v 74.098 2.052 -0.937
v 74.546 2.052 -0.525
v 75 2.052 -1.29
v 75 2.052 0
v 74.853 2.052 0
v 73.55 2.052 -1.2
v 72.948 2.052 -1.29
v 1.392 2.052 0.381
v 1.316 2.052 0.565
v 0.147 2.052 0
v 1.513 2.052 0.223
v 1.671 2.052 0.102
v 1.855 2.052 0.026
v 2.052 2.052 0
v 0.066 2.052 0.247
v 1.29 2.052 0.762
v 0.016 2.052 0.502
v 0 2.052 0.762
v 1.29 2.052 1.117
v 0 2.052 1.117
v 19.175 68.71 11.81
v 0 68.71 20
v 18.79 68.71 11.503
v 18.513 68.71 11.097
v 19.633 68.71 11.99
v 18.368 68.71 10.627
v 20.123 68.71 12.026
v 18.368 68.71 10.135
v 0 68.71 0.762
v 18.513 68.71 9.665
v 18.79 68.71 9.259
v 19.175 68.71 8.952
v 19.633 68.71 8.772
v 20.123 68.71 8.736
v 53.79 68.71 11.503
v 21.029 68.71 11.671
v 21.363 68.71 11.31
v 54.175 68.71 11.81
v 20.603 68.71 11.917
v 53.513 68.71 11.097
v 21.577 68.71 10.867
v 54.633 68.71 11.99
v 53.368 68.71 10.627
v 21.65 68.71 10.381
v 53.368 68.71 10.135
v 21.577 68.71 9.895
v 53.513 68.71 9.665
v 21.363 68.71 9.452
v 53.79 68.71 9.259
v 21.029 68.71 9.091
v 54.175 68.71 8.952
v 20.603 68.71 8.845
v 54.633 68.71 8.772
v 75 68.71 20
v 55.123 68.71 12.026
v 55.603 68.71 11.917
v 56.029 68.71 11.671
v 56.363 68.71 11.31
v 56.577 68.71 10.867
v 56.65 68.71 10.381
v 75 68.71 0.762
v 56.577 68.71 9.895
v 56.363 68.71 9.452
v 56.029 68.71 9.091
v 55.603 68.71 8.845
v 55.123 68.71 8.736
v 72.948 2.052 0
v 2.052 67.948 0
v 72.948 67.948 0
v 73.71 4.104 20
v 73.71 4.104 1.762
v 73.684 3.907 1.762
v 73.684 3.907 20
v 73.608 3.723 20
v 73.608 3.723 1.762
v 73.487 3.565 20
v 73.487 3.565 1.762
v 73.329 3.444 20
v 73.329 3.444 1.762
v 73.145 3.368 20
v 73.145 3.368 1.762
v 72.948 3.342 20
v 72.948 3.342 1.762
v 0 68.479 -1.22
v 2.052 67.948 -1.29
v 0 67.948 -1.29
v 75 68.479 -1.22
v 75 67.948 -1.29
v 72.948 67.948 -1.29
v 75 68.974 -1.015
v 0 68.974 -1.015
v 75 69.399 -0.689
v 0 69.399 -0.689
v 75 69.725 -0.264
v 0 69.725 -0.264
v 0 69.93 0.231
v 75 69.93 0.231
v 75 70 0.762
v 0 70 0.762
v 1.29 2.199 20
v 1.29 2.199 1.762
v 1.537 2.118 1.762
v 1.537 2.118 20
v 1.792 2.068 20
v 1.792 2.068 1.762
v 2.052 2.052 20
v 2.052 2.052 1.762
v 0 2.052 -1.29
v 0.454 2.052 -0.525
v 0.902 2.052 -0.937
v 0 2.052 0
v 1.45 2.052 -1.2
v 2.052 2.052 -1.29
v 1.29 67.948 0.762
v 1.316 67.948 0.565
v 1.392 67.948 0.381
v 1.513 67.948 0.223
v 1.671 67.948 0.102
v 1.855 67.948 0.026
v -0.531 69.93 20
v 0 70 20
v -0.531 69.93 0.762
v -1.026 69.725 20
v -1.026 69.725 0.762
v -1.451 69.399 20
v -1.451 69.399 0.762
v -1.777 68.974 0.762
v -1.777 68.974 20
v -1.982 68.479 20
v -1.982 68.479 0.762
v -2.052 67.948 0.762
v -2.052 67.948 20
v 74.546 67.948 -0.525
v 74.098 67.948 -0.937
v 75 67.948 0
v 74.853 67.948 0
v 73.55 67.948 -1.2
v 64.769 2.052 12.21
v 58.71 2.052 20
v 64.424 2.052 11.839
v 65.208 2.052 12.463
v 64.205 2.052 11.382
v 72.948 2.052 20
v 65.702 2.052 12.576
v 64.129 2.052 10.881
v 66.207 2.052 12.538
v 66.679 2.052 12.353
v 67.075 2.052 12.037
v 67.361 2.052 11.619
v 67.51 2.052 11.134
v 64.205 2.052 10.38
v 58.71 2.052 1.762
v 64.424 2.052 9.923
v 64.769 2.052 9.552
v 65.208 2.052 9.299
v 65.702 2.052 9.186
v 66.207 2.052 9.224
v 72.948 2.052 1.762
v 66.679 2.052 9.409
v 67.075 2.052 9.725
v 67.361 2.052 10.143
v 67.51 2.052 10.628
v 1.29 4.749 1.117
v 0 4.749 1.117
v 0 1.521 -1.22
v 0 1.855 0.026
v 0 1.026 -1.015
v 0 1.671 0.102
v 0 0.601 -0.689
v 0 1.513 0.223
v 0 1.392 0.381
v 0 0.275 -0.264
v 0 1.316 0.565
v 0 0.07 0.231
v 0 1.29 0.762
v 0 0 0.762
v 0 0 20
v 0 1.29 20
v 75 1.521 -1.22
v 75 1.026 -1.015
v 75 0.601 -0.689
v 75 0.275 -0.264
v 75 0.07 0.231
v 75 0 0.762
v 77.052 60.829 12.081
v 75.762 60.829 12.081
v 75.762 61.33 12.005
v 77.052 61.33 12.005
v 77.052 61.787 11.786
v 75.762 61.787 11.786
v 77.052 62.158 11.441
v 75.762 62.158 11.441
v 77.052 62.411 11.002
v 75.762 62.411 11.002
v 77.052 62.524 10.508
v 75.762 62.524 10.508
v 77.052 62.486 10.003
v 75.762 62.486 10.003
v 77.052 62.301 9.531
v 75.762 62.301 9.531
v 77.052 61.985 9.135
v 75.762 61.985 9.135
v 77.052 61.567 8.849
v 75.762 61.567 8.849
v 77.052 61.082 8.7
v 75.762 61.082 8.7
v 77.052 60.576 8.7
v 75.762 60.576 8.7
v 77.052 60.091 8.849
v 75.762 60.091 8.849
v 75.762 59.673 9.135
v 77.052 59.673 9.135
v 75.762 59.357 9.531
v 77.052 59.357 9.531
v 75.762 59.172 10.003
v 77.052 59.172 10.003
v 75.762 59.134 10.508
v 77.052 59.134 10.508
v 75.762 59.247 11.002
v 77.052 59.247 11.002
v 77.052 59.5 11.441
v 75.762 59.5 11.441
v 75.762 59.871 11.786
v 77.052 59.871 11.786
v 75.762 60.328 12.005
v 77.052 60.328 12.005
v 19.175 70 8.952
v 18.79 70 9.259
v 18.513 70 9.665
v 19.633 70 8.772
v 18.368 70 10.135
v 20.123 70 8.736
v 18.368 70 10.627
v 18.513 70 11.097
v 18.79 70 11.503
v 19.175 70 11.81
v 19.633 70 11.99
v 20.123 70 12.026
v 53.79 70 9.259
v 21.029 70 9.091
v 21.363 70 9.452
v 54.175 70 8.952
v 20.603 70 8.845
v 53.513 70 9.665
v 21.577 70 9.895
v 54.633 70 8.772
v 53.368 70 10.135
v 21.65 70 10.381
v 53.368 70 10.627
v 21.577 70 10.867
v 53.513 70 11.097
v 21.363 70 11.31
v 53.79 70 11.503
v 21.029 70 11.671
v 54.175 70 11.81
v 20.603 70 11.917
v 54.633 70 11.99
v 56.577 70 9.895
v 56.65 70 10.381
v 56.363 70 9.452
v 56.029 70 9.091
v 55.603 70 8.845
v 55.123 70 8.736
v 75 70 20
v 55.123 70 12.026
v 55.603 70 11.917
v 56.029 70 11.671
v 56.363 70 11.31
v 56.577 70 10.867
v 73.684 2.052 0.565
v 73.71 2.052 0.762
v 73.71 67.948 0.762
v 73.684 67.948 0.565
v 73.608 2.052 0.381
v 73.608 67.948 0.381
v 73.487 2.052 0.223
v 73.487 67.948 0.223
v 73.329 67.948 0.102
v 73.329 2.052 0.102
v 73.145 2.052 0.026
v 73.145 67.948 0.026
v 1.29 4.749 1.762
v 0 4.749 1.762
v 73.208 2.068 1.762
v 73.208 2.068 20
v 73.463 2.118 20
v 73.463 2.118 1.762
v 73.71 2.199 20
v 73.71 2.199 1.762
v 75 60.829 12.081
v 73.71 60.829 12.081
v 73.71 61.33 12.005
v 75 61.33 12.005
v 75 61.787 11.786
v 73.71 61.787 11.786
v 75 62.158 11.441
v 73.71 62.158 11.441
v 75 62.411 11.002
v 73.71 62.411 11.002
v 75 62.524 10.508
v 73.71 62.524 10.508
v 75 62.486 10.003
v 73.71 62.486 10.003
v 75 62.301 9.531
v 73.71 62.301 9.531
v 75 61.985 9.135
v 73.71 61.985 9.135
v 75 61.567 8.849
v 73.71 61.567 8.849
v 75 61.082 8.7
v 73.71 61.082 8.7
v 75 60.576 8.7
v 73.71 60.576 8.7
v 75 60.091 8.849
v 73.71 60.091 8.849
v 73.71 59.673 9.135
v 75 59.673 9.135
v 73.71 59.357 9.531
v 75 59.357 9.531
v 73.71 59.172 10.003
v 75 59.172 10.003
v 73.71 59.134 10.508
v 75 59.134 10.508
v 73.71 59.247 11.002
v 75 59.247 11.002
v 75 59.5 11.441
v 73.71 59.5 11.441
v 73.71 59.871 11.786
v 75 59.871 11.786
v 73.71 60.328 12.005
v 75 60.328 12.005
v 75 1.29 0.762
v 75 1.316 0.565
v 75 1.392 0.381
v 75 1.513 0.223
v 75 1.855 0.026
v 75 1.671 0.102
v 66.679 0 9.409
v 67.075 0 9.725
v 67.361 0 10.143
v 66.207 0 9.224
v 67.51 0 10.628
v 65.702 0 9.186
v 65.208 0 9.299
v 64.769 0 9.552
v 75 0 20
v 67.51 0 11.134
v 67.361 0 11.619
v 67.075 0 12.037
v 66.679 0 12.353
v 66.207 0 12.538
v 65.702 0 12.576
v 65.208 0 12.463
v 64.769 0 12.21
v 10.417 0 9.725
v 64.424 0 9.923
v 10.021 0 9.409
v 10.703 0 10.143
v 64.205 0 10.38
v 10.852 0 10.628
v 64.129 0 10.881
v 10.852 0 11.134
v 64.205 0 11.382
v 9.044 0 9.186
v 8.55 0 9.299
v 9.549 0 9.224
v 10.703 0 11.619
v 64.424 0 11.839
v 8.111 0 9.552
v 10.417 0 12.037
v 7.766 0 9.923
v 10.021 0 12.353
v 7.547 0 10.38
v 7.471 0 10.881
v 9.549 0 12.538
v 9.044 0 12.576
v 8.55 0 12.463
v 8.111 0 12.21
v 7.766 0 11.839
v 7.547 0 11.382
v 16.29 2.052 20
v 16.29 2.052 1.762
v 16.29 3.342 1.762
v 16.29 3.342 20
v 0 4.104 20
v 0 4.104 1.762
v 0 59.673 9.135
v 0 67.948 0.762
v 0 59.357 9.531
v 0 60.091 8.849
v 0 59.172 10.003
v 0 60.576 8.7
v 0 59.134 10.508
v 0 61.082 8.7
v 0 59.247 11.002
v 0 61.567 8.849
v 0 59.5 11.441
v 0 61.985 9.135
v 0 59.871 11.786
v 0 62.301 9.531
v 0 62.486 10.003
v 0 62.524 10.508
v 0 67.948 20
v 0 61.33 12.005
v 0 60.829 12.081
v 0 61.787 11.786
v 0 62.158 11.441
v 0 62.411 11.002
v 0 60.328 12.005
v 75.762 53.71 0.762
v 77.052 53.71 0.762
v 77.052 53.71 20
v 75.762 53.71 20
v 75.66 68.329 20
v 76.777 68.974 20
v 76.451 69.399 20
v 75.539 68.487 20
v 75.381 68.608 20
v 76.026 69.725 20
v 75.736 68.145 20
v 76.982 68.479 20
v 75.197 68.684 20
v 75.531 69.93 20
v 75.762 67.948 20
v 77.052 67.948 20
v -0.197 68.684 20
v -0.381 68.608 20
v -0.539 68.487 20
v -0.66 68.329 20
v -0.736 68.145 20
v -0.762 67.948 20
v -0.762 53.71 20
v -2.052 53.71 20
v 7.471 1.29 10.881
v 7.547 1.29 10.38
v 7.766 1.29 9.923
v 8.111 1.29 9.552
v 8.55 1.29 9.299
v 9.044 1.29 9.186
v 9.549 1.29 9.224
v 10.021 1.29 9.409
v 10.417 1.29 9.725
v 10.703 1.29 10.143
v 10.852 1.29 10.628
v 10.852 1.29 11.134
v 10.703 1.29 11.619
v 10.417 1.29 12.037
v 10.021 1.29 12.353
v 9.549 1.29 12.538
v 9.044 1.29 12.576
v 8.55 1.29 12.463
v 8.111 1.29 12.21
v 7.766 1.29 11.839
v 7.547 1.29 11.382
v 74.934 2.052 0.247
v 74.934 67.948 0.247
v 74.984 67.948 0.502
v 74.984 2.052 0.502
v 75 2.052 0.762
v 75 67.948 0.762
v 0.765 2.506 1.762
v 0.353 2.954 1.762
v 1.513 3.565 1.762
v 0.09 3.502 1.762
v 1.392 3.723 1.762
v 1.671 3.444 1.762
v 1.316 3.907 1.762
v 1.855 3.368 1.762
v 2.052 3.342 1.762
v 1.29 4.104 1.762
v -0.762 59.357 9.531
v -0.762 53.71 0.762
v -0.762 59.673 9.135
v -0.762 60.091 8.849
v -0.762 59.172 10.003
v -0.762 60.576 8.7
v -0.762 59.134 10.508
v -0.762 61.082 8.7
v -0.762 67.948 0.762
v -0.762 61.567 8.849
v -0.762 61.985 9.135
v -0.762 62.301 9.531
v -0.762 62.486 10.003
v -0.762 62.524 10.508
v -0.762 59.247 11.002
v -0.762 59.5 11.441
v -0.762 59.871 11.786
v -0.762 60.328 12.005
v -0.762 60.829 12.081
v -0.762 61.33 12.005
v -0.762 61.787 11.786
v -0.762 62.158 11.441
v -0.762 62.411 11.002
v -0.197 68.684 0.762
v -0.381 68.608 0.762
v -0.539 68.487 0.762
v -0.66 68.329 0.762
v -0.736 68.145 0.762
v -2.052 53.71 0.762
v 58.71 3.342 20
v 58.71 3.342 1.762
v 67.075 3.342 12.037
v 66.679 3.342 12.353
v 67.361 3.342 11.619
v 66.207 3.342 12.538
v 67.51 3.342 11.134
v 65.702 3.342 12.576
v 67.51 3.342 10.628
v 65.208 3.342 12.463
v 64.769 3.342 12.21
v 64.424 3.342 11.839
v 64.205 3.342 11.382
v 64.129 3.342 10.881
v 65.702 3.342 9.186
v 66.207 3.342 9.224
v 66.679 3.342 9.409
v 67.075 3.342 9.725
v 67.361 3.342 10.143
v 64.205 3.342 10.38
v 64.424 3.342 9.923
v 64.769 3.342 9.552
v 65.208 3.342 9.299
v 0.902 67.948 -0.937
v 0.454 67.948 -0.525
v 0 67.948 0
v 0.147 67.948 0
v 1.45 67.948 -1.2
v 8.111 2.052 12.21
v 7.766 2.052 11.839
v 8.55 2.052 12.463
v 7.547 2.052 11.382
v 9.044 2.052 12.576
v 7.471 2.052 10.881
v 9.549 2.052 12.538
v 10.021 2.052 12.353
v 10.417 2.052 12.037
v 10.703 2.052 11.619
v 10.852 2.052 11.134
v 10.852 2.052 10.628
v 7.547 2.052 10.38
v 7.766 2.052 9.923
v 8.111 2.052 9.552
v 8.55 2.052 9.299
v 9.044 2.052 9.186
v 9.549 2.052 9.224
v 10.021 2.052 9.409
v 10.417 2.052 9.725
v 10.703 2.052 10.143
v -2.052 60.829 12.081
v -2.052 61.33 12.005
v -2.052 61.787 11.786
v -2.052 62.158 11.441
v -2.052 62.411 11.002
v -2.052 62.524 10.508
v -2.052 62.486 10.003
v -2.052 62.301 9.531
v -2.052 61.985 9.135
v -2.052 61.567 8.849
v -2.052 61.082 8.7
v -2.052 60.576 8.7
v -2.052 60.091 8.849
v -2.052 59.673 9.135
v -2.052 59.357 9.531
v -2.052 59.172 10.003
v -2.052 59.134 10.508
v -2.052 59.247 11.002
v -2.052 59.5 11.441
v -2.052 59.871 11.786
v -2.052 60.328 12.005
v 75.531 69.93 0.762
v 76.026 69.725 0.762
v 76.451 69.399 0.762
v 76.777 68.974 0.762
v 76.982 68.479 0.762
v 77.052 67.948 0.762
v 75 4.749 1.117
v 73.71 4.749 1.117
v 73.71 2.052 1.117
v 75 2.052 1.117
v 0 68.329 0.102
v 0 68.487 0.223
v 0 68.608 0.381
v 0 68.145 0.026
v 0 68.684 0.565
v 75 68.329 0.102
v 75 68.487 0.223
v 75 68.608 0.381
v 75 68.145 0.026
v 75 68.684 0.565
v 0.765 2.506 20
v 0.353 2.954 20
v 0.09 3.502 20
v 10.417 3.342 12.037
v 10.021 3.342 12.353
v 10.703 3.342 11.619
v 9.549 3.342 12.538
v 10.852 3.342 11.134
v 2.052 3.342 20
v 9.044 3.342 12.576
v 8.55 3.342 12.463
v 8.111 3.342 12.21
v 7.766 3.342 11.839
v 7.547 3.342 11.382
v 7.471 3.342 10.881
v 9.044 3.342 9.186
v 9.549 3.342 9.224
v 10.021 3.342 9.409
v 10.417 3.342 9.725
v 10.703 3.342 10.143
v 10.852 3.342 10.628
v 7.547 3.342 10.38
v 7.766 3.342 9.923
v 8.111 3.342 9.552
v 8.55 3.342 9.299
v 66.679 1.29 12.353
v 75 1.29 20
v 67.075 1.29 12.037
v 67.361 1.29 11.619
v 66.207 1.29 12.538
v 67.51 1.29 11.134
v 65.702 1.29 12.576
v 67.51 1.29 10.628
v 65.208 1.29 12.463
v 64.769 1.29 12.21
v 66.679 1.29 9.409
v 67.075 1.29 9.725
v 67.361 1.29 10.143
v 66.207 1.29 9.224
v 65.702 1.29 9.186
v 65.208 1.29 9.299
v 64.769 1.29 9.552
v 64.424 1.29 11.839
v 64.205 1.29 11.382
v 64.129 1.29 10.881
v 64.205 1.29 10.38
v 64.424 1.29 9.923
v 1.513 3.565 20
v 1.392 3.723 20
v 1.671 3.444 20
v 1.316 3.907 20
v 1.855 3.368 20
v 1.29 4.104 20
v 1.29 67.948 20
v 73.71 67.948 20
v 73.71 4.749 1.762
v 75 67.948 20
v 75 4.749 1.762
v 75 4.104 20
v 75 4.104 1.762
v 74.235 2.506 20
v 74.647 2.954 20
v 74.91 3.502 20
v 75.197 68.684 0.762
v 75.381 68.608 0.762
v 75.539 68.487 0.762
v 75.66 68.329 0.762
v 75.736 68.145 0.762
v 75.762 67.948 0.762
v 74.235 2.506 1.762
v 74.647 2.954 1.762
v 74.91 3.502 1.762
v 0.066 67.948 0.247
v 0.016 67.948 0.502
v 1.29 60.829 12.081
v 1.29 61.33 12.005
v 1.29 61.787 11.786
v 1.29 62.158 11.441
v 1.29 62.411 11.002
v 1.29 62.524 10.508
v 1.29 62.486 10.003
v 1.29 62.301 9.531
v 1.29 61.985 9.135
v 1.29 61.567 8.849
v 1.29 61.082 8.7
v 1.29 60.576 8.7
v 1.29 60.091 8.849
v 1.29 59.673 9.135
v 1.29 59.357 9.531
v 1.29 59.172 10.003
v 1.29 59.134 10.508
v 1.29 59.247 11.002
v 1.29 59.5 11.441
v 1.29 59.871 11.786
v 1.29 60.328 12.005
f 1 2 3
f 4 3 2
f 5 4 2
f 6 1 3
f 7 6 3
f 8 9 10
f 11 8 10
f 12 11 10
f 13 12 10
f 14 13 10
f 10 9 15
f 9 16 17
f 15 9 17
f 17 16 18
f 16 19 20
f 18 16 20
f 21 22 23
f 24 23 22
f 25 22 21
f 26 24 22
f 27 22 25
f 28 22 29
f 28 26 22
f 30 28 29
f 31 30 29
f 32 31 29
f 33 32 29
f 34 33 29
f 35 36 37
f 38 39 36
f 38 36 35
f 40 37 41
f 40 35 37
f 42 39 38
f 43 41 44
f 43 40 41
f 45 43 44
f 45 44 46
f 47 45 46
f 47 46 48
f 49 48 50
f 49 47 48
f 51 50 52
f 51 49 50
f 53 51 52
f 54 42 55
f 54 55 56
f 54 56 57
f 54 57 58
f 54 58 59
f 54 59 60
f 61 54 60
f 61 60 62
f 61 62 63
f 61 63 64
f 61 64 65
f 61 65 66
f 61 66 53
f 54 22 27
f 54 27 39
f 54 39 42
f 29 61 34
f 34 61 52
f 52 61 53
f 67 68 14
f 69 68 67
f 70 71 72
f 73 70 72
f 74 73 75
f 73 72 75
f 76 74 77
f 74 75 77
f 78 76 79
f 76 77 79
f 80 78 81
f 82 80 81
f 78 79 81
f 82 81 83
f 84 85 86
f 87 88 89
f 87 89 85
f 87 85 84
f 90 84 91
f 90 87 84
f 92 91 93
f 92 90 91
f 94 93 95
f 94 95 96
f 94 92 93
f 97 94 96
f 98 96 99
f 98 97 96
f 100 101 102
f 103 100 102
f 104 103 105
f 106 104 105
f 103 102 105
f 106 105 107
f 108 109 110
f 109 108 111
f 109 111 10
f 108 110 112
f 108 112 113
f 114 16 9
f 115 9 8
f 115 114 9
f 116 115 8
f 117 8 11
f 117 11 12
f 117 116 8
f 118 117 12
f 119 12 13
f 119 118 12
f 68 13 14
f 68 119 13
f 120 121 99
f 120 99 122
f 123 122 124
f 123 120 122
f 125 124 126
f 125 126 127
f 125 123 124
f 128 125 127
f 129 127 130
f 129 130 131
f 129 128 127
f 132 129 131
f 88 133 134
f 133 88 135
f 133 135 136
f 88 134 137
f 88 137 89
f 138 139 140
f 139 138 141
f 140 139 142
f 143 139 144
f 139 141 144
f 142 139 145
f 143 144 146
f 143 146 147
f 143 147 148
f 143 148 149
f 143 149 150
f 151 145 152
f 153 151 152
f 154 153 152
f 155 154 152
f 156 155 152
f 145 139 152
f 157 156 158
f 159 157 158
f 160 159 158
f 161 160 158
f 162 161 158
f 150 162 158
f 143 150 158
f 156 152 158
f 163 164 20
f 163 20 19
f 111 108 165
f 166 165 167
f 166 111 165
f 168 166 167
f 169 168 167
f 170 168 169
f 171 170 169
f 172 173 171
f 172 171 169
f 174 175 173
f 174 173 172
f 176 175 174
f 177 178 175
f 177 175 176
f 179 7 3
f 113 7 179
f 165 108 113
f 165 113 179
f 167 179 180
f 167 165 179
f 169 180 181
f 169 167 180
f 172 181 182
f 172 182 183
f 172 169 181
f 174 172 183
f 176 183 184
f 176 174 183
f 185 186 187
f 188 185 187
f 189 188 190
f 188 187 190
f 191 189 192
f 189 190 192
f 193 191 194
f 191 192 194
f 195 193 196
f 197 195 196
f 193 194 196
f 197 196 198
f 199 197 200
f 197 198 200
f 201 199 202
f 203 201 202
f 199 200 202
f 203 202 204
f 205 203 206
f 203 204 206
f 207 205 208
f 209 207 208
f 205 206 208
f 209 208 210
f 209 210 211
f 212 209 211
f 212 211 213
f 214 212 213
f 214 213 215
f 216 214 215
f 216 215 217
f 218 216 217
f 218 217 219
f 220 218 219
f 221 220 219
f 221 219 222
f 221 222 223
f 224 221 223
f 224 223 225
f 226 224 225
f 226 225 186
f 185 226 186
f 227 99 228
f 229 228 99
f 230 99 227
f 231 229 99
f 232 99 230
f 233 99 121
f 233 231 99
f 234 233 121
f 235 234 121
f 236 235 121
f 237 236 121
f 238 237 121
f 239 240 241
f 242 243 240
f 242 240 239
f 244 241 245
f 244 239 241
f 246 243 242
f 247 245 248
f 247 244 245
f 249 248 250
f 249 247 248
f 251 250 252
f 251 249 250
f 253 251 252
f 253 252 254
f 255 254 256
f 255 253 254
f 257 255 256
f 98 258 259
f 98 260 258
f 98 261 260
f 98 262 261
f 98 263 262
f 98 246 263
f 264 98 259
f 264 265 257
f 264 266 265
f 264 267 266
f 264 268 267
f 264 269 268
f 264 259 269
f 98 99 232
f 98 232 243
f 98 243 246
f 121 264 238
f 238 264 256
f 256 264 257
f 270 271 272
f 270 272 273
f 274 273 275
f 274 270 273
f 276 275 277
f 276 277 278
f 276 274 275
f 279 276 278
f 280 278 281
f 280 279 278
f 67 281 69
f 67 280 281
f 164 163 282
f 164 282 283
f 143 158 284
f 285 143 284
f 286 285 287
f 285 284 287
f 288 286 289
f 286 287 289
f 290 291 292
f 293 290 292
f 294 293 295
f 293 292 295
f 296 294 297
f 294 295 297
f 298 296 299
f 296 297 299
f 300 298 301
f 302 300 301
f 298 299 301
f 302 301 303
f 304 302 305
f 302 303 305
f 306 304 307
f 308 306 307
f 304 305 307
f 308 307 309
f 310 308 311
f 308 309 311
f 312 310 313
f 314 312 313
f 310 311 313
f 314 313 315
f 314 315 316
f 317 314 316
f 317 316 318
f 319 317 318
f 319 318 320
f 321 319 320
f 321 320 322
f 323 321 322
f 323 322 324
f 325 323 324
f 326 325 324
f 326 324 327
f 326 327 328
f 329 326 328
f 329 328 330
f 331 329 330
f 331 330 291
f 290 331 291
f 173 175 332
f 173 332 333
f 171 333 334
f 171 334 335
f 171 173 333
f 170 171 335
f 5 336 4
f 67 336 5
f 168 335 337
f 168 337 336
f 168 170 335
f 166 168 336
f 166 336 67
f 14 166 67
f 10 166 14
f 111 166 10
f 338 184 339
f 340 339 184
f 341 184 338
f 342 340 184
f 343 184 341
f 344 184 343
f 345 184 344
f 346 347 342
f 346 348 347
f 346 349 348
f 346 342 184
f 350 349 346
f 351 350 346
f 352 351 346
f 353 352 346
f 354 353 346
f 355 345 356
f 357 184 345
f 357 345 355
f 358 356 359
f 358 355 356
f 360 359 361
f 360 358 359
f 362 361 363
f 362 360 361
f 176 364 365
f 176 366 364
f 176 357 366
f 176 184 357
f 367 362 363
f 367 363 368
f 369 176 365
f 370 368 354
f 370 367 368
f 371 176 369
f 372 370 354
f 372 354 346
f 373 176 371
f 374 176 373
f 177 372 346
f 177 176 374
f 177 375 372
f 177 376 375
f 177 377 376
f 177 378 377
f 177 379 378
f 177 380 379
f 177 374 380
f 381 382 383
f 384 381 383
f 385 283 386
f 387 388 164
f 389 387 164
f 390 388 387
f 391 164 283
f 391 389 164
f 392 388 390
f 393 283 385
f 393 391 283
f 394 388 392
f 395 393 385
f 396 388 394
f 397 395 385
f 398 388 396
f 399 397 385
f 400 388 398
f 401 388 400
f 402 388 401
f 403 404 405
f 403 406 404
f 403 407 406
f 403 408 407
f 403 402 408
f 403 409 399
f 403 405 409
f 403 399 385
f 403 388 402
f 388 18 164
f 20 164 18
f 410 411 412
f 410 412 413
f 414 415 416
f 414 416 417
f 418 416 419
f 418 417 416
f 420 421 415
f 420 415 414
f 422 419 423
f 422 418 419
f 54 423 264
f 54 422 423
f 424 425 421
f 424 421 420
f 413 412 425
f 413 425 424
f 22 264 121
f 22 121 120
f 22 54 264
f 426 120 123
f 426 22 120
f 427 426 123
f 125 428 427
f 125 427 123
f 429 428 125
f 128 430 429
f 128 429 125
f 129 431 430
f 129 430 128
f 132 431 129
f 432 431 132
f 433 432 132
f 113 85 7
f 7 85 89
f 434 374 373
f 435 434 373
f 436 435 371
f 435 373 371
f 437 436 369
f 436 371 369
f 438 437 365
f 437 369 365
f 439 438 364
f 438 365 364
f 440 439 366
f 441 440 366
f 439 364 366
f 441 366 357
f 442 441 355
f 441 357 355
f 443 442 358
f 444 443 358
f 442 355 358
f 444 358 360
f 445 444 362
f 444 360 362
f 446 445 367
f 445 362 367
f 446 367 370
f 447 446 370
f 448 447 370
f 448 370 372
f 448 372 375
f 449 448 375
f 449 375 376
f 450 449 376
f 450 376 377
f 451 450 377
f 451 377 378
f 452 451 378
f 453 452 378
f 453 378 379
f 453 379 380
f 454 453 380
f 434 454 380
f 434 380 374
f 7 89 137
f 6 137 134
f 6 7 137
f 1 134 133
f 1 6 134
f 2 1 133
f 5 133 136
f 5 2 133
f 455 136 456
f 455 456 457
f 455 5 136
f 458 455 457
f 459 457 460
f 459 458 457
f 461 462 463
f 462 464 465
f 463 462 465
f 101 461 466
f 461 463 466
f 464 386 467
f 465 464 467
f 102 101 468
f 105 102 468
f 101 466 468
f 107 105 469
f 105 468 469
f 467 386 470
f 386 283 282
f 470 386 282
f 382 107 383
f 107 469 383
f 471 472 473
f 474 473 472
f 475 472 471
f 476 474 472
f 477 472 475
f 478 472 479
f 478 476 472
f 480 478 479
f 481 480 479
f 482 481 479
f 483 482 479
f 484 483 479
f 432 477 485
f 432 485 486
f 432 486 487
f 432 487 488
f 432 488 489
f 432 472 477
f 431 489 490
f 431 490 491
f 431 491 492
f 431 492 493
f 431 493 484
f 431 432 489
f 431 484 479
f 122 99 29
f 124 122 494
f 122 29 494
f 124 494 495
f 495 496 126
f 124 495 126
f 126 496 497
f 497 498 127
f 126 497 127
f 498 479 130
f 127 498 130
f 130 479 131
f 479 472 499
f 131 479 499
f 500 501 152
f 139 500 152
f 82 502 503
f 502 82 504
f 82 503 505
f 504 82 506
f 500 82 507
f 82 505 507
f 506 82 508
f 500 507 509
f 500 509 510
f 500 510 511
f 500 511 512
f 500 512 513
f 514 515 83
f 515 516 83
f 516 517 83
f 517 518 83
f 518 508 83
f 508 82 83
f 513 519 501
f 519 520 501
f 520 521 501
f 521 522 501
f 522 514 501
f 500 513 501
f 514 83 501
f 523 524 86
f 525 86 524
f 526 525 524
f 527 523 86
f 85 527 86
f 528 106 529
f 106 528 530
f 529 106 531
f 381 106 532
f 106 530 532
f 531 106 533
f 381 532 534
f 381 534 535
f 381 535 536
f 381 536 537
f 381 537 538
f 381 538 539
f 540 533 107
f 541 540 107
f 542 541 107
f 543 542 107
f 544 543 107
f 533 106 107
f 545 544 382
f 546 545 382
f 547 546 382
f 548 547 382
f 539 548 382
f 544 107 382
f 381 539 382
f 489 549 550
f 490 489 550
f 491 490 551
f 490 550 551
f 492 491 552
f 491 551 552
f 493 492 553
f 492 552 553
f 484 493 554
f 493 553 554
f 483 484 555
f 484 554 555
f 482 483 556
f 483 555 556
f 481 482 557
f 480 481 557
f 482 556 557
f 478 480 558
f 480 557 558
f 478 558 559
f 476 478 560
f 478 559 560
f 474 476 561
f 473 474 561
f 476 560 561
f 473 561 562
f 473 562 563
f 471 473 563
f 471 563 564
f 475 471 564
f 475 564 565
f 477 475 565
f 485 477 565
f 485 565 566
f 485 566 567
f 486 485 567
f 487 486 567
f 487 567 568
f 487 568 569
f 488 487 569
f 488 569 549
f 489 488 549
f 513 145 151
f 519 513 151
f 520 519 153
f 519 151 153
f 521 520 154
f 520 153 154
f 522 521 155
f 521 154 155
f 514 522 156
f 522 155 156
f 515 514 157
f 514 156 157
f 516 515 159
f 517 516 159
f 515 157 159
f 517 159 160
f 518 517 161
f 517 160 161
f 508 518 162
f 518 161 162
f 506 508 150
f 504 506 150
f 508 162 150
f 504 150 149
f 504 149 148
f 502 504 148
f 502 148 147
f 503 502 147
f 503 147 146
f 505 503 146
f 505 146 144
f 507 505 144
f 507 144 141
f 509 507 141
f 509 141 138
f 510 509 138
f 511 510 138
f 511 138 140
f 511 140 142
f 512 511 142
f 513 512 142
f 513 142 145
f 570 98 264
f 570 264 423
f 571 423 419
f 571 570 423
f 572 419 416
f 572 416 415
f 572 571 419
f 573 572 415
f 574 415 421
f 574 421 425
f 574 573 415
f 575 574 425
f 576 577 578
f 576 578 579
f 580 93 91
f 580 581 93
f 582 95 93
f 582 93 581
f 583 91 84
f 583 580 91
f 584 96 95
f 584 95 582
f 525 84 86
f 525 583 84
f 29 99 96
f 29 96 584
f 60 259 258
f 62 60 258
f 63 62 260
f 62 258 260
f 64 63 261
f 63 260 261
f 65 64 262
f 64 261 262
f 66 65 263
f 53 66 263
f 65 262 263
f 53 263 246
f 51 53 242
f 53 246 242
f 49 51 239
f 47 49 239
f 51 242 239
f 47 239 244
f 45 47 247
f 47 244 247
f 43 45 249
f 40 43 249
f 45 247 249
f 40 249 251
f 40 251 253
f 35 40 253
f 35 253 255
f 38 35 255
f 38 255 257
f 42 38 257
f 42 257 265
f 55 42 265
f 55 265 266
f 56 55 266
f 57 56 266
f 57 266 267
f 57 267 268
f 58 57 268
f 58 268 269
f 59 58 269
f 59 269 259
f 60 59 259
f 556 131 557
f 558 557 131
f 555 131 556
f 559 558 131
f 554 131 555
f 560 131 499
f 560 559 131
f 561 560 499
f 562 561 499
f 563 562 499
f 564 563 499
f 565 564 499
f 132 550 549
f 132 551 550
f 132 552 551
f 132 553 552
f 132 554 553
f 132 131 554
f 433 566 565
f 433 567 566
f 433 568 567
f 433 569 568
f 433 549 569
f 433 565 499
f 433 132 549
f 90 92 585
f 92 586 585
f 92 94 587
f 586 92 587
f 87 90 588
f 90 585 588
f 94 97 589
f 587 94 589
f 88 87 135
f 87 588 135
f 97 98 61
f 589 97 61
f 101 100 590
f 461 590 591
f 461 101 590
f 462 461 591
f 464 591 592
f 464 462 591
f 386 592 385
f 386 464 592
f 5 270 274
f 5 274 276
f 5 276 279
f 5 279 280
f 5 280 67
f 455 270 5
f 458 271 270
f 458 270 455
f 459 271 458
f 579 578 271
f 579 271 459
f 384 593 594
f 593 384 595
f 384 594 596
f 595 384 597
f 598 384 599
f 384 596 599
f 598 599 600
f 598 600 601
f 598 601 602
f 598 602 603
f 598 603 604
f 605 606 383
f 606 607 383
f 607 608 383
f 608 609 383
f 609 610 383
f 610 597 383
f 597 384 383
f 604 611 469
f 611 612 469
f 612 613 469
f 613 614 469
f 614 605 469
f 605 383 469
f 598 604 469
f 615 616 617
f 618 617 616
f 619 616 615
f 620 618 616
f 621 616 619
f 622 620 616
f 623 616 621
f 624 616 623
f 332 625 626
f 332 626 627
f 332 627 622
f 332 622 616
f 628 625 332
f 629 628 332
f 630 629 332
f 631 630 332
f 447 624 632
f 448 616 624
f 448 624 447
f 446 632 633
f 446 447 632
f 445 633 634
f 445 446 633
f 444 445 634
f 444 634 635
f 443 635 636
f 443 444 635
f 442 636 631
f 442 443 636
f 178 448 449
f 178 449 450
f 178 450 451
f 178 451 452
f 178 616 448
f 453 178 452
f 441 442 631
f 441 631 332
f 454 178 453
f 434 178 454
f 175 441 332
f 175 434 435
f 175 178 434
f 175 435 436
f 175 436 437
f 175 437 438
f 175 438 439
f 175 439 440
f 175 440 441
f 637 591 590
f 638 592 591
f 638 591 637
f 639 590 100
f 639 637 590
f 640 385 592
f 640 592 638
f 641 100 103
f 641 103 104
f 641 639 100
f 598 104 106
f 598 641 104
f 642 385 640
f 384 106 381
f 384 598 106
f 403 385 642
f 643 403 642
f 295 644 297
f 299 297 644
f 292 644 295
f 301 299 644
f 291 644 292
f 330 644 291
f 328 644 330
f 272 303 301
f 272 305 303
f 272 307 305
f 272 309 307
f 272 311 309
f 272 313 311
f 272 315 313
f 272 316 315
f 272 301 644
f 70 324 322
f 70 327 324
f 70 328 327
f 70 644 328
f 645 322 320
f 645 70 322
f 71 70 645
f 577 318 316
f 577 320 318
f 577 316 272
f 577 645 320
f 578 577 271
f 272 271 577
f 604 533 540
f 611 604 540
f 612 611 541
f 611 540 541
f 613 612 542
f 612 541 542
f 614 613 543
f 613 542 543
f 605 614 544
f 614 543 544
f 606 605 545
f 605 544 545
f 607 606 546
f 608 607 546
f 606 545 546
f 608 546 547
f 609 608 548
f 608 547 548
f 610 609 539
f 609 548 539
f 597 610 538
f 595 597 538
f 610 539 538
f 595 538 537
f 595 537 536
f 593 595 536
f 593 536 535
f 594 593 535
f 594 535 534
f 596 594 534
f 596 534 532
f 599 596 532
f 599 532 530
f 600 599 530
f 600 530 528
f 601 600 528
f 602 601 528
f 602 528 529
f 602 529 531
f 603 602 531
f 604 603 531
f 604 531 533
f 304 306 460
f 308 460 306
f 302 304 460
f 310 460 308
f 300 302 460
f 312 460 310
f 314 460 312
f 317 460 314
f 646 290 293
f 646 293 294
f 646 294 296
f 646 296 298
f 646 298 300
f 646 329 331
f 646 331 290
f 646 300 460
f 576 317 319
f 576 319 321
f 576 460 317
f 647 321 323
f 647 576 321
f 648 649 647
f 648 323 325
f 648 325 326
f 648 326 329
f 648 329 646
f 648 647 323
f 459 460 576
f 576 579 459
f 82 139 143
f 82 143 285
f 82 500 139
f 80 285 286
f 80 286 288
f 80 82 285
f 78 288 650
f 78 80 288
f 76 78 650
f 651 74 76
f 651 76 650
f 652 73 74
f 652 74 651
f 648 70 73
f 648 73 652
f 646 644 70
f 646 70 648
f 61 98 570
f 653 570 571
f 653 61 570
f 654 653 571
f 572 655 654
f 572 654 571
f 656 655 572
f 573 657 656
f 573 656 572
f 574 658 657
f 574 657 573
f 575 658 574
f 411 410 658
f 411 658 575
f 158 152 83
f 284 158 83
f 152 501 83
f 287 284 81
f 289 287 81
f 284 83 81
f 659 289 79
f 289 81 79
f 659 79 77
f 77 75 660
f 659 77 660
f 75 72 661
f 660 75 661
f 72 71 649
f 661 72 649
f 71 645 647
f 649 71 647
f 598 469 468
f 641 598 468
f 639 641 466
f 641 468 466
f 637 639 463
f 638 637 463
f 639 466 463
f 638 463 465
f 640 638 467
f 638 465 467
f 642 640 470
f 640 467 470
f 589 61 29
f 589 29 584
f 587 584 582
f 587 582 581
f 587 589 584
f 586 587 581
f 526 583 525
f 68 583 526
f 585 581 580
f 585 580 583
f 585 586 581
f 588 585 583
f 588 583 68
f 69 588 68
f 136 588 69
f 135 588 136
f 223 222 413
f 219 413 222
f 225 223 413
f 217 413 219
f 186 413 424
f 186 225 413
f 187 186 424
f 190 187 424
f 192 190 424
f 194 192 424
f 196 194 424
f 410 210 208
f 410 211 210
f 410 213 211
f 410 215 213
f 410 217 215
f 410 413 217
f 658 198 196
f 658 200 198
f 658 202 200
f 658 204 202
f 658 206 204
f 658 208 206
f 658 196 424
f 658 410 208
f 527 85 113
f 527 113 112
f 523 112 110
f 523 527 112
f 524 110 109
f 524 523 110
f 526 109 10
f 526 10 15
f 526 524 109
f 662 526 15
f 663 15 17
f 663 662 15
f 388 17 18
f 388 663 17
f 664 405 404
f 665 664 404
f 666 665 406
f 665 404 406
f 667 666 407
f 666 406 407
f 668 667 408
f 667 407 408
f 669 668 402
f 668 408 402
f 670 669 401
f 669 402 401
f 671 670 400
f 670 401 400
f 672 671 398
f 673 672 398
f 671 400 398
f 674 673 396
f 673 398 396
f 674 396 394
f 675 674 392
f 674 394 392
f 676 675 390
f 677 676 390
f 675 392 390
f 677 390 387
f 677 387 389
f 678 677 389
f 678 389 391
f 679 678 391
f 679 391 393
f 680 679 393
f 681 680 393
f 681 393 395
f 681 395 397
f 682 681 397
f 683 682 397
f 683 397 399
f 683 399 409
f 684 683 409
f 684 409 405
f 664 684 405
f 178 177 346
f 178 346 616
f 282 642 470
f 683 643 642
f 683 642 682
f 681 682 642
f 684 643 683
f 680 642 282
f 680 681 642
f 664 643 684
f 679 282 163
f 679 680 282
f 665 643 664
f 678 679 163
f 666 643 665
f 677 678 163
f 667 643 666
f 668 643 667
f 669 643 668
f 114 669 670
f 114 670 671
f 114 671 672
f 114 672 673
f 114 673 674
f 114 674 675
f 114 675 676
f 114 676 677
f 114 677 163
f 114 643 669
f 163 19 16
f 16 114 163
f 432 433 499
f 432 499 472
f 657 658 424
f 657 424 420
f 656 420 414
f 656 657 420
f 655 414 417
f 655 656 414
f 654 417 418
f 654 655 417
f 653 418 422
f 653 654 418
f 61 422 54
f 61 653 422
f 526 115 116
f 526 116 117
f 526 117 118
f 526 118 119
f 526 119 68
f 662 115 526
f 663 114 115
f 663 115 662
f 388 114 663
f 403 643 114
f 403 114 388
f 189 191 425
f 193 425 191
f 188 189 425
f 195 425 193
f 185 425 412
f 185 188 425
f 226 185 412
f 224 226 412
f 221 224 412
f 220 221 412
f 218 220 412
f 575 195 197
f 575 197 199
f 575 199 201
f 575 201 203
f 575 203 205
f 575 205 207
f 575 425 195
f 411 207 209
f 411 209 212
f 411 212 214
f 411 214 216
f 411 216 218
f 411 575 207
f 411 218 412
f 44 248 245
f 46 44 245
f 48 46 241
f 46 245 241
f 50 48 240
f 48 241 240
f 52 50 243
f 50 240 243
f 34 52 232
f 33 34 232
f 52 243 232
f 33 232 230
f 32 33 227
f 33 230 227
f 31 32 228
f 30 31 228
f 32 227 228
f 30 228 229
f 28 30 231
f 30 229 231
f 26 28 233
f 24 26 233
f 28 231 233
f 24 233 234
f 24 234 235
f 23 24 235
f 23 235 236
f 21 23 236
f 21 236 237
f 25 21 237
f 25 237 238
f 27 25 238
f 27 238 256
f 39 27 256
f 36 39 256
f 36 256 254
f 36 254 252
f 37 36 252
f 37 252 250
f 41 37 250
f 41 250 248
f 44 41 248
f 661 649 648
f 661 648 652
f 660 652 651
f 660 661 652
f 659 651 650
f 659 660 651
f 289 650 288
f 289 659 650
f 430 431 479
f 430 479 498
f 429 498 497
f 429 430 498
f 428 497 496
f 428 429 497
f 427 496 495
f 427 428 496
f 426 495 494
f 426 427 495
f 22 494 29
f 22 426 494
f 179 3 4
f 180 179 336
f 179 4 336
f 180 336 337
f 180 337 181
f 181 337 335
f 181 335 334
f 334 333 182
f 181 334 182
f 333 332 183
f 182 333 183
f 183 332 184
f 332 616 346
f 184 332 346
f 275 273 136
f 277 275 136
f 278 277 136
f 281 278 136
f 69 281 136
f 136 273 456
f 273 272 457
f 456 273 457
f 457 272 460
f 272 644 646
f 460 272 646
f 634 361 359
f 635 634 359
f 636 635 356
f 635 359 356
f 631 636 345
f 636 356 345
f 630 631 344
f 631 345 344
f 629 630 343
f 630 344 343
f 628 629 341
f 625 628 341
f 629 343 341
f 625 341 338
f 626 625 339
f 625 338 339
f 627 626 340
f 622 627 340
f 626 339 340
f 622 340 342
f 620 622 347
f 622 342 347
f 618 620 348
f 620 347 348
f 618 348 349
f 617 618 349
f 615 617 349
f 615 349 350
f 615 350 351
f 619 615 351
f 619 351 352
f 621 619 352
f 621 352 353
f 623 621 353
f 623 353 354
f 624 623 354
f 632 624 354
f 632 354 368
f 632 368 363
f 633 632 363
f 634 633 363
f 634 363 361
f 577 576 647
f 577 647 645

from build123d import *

# Parameters (mm, degrees)
SKETCH1_W                        = 75
SKETCH1_H                        = 70
BASE_FLANGE1_DEPTH               = 1.29
EDGE_FLANGE1_STRIP_W             = 6.684
EDGE_FLANGE1_STRIP_H             = 1.29
EDGE_FLANGE1_STRIP_CUT_DEPTH     = 75
EDGE_FLANGE1_DEPTH               = 75
EDGE_FLANGE2_STRIP_W             = 6.684
EDGE_FLANGE2_STRIP_H             = 1.29
EDGE_FLANGE2_STRIP_CUT_DEPTH     = 75
EDGE_FLANGE2_DEPTH               = 75
EDGE_FLANGE3_STRIP_W             = 6.684
EDGE_FLANGE3_STRIP_H             = 1.29
EDGE_FLANGE3_STRIP_CUT_DEPTH     = 65.896
EDGE_FLANGE3_DEPTH               = 65.896
EDGE_FLANGE4_STRIP_W             = 6.684
EDGE_FLANGE4_STRIP_H             = 1.29
EDGE_FLANGE4_STRIP_CUT_DEPTH     = 65.896
EDGE_FLANGE4_DEPTH               = 65.896
EDGE_FLANGE6_START               = 1.117
EDGE_FLANGE6_DEPTH               = 18.883
EDGE_FLANGE6_2_DEPTH             = 0.645
EDGE_FLANGE6_START_2             = 1.762
EDGE_FLANGE6_3_DEPTH             = 18.238
EDGE_FLANGE8_START               = 1.117
EDGE_FLANGE8_DEPTH               = 18.883
EDGE_FLANGE8_2_DEPTH             = 0.645
EDGE_FLANGE8_START_2             = 1.762
EDGE_FLANGE8_3_DEPTH             = 18.238
EDGE_FLANGE9_DEPTH               = 19.238
EDGE_FLANGE10_DEPTH              = 19.238
TAP_DRILL_FOR_M4X0_7_TAP1_REACH  = 108.005
TAP_DRILL_FOR_M4X0_7_TAP1_BORE_R = 1.65
M3_CLEARANCE_HOLE1_D             = 3.4
M3_CLEARANCE_HOLE1_DEPTH         = 3.342
M3_CLEARANCE_HOLE2_D             = 3.4


# Read off the part's stored shape, not the designer's step: Edge-Flange6, Edge-Flange8
# Sheet-metal steps are written as plain solids
with BuildPart() as part:
    # Sketch1 → Base-Flange1 (new body)
    with BuildSketch(Plane.XY):
        with Locations((37.5, 35)):
            Rectangle(SKETCH1_W, SKETCH1_H)
    extrude(amount=-BASE_FLANGE1_DEPTH)

    # Edge-Flange1 strip (across the edge) → Edge-Flange1 strip cut (cut)
    with BuildSketch(Plane(origin=(75, 70, 0), x_dir=(0, -1, 0), z_dir=(-1, 0, 0))):
        with Locations((-1.29, -0.645)):
            Rectangle(EDGE_FLANGE1_STRIP_W, EDGE_FLANGE1_STRIP_H)
    extrude(amount=EDGE_FLANGE1_STRIP_CUT_DEPTH, mode=Mode.SUBTRACT)

    # Edge-Flange1 section (across the edge) → Edge-Flange1 (add)
    with BuildSketch(Plane(origin=(75, 70, 0), x_dir=(0, -1, 0), z_dir=(-1, 0, 0))):
        with BuildLine():
            Line((0, 0.762), (0, 20))
            Line((0, 20), (1.29, 20))
            Line((1.29, 20), (1.29, 0.762))
            ThreePointArc((1.29, 0.762), (1.513184633, 0.223184633), (2.052, 0))
            Line((2.052, 0), (2.052, -1.29))
            ThreePointArc((2.052, -1.29), (0.601016885, -0.688983115), (0, 0.762))
        make_face()
    extrude(amount=EDGE_FLANGE1_DEPTH)

    # Edge-Flange2 strip (across the edge) → Edge-Flange2 strip cut (cut)
    with BuildSketch(Plane.YZ):
        with Locations((-1.29, -0.645)):
            Rectangle(EDGE_FLANGE2_STRIP_W, EDGE_FLANGE2_STRIP_H)
    extrude(amount=EDGE_FLANGE2_STRIP_CUT_DEPTH, mode=Mode.SUBTRACT)

    # Edge-Flange2 section (across the edge) → Edge-Flange2 (add)
    with BuildSketch(Plane.YZ):
        with BuildLine():
            Line((0, 0.762), (0, 20))
            Line((0, 20), (1.29, 20))
            Line((1.29, 20), (1.29, 0.762))
            ThreePointArc((1.29, 0.762), (1.513184633, 0.223184633), (2.052, 0))
            Line((2.052, 0), (2.052, -1.29))
            ThreePointArc((2.052, -1.29), (0.601016885, -0.688983115), (0, 0.762))
        make_face()
    extrude(amount=EDGE_FLANGE2_DEPTH)

    # Edge-Flange3 strip (across the edge) → Edge-Flange3 strip cut (cut)
    with BuildSketch(Plane.XZ.offset(-67.948)):
        with Locations((-1.29, -0.645)):
            Rectangle(EDGE_FLANGE3_STRIP_W, EDGE_FLANGE3_STRIP_H)
    extrude(amount=EDGE_FLANGE3_STRIP_CUT_DEPTH, mode=Mode.SUBTRACT)

    # Edge-Flange3 section (across the edge) → Edge-Flange3 (add)
    with BuildSketch(Plane.XZ.offset(-67.948)):
        with BuildLine():
            Line((0, 0.762), (0, 20))
            Line((0, 20), (1.29, 20))
            Line((1.29, 20), (1.29, 0.762))
            ThreePointArc((1.29, 0.762), (1.513184633, 0.223184633), (2.052, 0))
            Line((2.052, 0), (2.052, -1.29))
            ThreePointArc((2.052, -1.29), (0.601016885, -0.688983115), (0, 0.762))
        make_face()
    extrude(amount=EDGE_FLANGE3_DEPTH)

    # Edge-Flange4 strip (across the edge) → Edge-Flange4 strip cut (cut)
    with BuildSketch(Plane(origin=(75, 2.052, 0), x_dir=(-1, 0, 0), z_dir=(0, 1, 0))):
        with Locations((-1.29, -0.645)):
            Rectangle(EDGE_FLANGE4_STRIP_W, EDGE_FLANGE4_STRIP_H)
    extrude(amount=EDGE_FLANGE4_STRIP_CUT_DEPTH, mode=Mode.SUBTRACT)

    # Edge-Flange4 section (across the edge) → Edge-Flange4 (add)
    with BuildSketch(Plane(origin=(75, 2.052, 0), x_dir=(-1, 0, 0), z_dir=(0, 1, 0))):
        with BuildLine():
            Line((0, 0.762), (0, 20))
            Line((0, 20), (1.29, 20))
            Line((1.29, 20), (1.29, 0.762))
            ThreePointArc((1.29, 0.762), (1.513184633, 0.223184633), (2.052, 0))
            Line((2.052, 0), (2.052, -1.29))
            ThreePointArc((2.052, -1.29), (0.601016885, -0.688983115), (0, 0.762))
        make_face()
    extrude(amount=EDGE_FLANGE4_DEPTH)

    # Edge-Flange6 outline → Edge-Flange6 (cut)
    with BuildSketch(Plane.XY.offset(EDGE_FLANGE6_START)):
        with BuildLine():
            Line((1.29, 2.052), (1.29, 2.198728366))
            ThreePointArc((1.29, 2.198728366), (0.352834322, 2.953547915), (0, 4.104))
            Line((0, 4.104), (0, 2.052))
            Line((0, 2.052), (1.29, 2.052))
        make_face()
    extrude(amount=EDGE_FLANGE6_DEPTH, mode=Mode.SUBTRACT)

    # Edge-Flange6 2 outline → Edge-Flange6 2 (cut)
    with BuildSketch(Plane.XY.offset(EDGE_FLANGE6_START)):
        with BuildLine():
            ThreePointArc((0, 4.104), (0.352834322, 2.953547915), (1.29, 2.198728366))
            Line((1.29, 2.198728366), (1.29, 4.749))
            Line((1.29, 4.749), (0, 4.749))
            Line((0, 4.749), (0, 4.104))
        make_face()
    extrude(amount=EDGE_FLANGE6_2_DEPTH, mode=Mode.SUBTRACT)

    # Edge-Flange6 3 outline → Edge-Flange6 3 (add)
    with BuildSketch(Plane.XY.offset(EDGE_FLANGE6_START_2)):
        with BuildLine():
            Line((2.052, 2.052), (16.29, 2.052))
            Line((16.29, 2.052), (16.29, 3.342))
            Line((16.29, 3.342), (2.052, 3.342))
            ThreePointArc((2.052, 3.342), (1.513184633, 3.565184633), (1.29, 4.104))
            Line((1.29, 4.104), (1.29, 2.198728366))
            ThreePointArc((1.29, 2.198728366), (1.664000898, 2.089015956), (2.052, 2.052))
        make_face()
    extrude(amount=EDGE_FLANGE6_3_DEPTH)

    # Edge-Flange8 outline → Edge-Flange8 (cut)
    with BuildSketch(Plane.XY.offset(EDGE_FLANGE8_START)):
        with BuildLine():
            ThreePointArc((75, 4.104), (74.647165678, 2.953547915), (73.71, 2.198728366))
            Line((73.71, 2.198728366), (73.71, 2.052))
            Line((73.71, 2.052), (75, 2.052))
            Line((75, 2.052), (75, 4.104))
        make_face()
    extrude(amount=EDGE_FLANGE8_DEPTH, mode=Mode.SUBTRACT)

    # Edge-Flange8 2 outline → Edge-Flange8 2 (cut)
    with BuildSketch(Plane.XY.offset(EDGE_FLANGE8_START)):
        with BuildLine():
            Line((73.71, 4.749), (73.71, 2.198728366))
            ThreePointArc((73.71, 2.198728366), (74.647165678, 2.953547915), (75, 4.104))
            Line((75, 4.104), (75, 4.749))
            Line((75, 4.749), (73.71, 4.749))
        make_face()
    extrude(amount=EDGE_FLANGE8_2_DEPTH, mode=Mode.SUBTRACT)

    # Edge-Flange8 3 outline → Edge-Flange8 3 (add)
    with BuildSketch(Plane.XY.offset(EDGE_FLANGE8_START_2)):
        with BuildLine():
            Line((58.71, 2.052), (72.948, 2.052))
            ThreePointArc((72.948, 2.052), (73.335999102, 2.089015956), (73.71, 2.198728366))
            Line((73.71, 2.198728366), (73.71, 4.104))
            ThreePointArc((73.71, 4.104), (73.486815367, 3.565184633), (72.948, 3.342))
            Line((72.948, 3.342), (58.71, 3.342))
            Line((58.71, 3.342), (58.71, 2.052))
        make_face()
    extrude(amount=EDGE_FLANGE8_3_DEPTH)

    # Edge-Flange9 section (across the edge) → Edge-Flange9 (add)
    with BuildSketch(Plane(origin=(75.762, 68.71, 0.762), x_dir=(-1, 0, 0), z_dir=(0, 0, 1))):
        with BuildLine():
            Line((-1.29, 0.762), (-1.29, 15))
            Line((-1.29, 15), (0, 15))
            Line((0, 15), (0, 0.762))
            ThreePointArc((0, 0.762), (0.223184633, 0.223184633), (0.762, 0))
            Line((0.762, 0), (0.762, -1.29))
            ThreePointArc((0.762, -1.29), (-0.688983115, -0.688983115), (-1.29, 0.762))
        make_face()
    extrude(amount=EDGE_FLANGE9_DEPTH)

    # Edge-Flange10 section (across the edge) → Edge-Flange10 (add)
    with BuildSketch(Plane(origin=(-0.762, 68.71, 20), x_dir=(1, 0, 0), z_dir=(0, 0, -1))):
        with BuildLine():
            Line((-1.29, 0.762), (-1.29, 15))
            Line((-1.29, 15), (0, 15))
            Line((0, 15), (0, 0.762))
            ThreePointArc((0, 0.762), (0.223184633, 0.223184633), (0.762, 0))
            Line((0.762, 0), (0.762, -1.29))
            ThreePointArc((0.762, -1.29), (-0.688983115, -0.688983115), (-1.29, 0.762))
        make_face()
    extrude(amount=EDGE_FLANGE10_DEPTH)

    # Tap Drill for M4x0.7 Tap1 bore → Tap Drill for M4x0.7 Tap1 (cut, up to next)
    with BuildSketch(Plane(origin=(0, 70, 0), x_dir=(1, 0, 0), z_dir=(0, 1, 0)), mode=Mode.PRIVATE) as tap_drill_for_m4x0_7_tap1_sk1:
        with Locations((55, -10.381)):
            Circle(TAP_DRILL_FOR_M4X0_7_TAP1_BORE_R)
    tap_drill_for_m4x0_7_tap1_tool1 = extrude(tap_drill_for_m4x0_7_tap1_sk1.sketch, amount=-TAP_DRILL_FOR_M4X0_7_TAP1_REACH, mode=Mode.PRIVATE) & part.part
    # Tap Drill for M4x0.7 Tap1 bore → Tap Drill for M4x0.7 Tap1 (cut, up to next)
    with BuildSketch(Plane(origin=(0, 70, 0), x_dir=(1, 0, 0), z_dir=(0, 1, 0)), mode=Mode.PRIVATE) as tap_drill_for_m4x0_7_tap1_sk2:
        with Locations((20, -10.381)):
            Circle(TAP_DRILL_FOR_M4X0_7_TAP1_BORE_R)
    tap_drill_for_m4x0_7_tap1_tool2 = extrude(tap_drill_for_m4x0_7_tap1_sk2.sketch, amount=-TAP_DRILL_FOR_M4X0_7_TAP1_REACH, mode=Mode.PRIVATE) & part.part
    add(tap_drill_for_m4x0_7_tap1_tool1.solids().sort_by_distance((55, 70, 10.381))[0], mode=Mode.SUBTRACT)
    add(tap_drill_for_m4x0_7_tap1_tool2.solids().sort_by_distance((20, 70, 10.381))[0], mode=Mode.SUBTRACT)

    # M3 Clearance Hole1
    with Locations(Plane(origin=(0, 3.342, 0), x_dir=(1, 0, 0), z_dir=(0, 1, 0))):
        with Locations((9.171, -10.881), (65.829, -10.881)):
            Hole(M3_CLEARANCE_HOLE1_D / 2, depth=M3_CLEARANCE_HOLE1_DEPTH)

    # M3 Clearance Hole2 (through all)
    with Locations(Plane(origin=(77.052, 0, 0), x_dir=(0, 0, -1), z_dir=(1, 0, 0))):
        with Locations((-10.381, 60.829)):
            Hole(M3_CLEARANCE_HOLE2_D / 2)


solid = part.part
